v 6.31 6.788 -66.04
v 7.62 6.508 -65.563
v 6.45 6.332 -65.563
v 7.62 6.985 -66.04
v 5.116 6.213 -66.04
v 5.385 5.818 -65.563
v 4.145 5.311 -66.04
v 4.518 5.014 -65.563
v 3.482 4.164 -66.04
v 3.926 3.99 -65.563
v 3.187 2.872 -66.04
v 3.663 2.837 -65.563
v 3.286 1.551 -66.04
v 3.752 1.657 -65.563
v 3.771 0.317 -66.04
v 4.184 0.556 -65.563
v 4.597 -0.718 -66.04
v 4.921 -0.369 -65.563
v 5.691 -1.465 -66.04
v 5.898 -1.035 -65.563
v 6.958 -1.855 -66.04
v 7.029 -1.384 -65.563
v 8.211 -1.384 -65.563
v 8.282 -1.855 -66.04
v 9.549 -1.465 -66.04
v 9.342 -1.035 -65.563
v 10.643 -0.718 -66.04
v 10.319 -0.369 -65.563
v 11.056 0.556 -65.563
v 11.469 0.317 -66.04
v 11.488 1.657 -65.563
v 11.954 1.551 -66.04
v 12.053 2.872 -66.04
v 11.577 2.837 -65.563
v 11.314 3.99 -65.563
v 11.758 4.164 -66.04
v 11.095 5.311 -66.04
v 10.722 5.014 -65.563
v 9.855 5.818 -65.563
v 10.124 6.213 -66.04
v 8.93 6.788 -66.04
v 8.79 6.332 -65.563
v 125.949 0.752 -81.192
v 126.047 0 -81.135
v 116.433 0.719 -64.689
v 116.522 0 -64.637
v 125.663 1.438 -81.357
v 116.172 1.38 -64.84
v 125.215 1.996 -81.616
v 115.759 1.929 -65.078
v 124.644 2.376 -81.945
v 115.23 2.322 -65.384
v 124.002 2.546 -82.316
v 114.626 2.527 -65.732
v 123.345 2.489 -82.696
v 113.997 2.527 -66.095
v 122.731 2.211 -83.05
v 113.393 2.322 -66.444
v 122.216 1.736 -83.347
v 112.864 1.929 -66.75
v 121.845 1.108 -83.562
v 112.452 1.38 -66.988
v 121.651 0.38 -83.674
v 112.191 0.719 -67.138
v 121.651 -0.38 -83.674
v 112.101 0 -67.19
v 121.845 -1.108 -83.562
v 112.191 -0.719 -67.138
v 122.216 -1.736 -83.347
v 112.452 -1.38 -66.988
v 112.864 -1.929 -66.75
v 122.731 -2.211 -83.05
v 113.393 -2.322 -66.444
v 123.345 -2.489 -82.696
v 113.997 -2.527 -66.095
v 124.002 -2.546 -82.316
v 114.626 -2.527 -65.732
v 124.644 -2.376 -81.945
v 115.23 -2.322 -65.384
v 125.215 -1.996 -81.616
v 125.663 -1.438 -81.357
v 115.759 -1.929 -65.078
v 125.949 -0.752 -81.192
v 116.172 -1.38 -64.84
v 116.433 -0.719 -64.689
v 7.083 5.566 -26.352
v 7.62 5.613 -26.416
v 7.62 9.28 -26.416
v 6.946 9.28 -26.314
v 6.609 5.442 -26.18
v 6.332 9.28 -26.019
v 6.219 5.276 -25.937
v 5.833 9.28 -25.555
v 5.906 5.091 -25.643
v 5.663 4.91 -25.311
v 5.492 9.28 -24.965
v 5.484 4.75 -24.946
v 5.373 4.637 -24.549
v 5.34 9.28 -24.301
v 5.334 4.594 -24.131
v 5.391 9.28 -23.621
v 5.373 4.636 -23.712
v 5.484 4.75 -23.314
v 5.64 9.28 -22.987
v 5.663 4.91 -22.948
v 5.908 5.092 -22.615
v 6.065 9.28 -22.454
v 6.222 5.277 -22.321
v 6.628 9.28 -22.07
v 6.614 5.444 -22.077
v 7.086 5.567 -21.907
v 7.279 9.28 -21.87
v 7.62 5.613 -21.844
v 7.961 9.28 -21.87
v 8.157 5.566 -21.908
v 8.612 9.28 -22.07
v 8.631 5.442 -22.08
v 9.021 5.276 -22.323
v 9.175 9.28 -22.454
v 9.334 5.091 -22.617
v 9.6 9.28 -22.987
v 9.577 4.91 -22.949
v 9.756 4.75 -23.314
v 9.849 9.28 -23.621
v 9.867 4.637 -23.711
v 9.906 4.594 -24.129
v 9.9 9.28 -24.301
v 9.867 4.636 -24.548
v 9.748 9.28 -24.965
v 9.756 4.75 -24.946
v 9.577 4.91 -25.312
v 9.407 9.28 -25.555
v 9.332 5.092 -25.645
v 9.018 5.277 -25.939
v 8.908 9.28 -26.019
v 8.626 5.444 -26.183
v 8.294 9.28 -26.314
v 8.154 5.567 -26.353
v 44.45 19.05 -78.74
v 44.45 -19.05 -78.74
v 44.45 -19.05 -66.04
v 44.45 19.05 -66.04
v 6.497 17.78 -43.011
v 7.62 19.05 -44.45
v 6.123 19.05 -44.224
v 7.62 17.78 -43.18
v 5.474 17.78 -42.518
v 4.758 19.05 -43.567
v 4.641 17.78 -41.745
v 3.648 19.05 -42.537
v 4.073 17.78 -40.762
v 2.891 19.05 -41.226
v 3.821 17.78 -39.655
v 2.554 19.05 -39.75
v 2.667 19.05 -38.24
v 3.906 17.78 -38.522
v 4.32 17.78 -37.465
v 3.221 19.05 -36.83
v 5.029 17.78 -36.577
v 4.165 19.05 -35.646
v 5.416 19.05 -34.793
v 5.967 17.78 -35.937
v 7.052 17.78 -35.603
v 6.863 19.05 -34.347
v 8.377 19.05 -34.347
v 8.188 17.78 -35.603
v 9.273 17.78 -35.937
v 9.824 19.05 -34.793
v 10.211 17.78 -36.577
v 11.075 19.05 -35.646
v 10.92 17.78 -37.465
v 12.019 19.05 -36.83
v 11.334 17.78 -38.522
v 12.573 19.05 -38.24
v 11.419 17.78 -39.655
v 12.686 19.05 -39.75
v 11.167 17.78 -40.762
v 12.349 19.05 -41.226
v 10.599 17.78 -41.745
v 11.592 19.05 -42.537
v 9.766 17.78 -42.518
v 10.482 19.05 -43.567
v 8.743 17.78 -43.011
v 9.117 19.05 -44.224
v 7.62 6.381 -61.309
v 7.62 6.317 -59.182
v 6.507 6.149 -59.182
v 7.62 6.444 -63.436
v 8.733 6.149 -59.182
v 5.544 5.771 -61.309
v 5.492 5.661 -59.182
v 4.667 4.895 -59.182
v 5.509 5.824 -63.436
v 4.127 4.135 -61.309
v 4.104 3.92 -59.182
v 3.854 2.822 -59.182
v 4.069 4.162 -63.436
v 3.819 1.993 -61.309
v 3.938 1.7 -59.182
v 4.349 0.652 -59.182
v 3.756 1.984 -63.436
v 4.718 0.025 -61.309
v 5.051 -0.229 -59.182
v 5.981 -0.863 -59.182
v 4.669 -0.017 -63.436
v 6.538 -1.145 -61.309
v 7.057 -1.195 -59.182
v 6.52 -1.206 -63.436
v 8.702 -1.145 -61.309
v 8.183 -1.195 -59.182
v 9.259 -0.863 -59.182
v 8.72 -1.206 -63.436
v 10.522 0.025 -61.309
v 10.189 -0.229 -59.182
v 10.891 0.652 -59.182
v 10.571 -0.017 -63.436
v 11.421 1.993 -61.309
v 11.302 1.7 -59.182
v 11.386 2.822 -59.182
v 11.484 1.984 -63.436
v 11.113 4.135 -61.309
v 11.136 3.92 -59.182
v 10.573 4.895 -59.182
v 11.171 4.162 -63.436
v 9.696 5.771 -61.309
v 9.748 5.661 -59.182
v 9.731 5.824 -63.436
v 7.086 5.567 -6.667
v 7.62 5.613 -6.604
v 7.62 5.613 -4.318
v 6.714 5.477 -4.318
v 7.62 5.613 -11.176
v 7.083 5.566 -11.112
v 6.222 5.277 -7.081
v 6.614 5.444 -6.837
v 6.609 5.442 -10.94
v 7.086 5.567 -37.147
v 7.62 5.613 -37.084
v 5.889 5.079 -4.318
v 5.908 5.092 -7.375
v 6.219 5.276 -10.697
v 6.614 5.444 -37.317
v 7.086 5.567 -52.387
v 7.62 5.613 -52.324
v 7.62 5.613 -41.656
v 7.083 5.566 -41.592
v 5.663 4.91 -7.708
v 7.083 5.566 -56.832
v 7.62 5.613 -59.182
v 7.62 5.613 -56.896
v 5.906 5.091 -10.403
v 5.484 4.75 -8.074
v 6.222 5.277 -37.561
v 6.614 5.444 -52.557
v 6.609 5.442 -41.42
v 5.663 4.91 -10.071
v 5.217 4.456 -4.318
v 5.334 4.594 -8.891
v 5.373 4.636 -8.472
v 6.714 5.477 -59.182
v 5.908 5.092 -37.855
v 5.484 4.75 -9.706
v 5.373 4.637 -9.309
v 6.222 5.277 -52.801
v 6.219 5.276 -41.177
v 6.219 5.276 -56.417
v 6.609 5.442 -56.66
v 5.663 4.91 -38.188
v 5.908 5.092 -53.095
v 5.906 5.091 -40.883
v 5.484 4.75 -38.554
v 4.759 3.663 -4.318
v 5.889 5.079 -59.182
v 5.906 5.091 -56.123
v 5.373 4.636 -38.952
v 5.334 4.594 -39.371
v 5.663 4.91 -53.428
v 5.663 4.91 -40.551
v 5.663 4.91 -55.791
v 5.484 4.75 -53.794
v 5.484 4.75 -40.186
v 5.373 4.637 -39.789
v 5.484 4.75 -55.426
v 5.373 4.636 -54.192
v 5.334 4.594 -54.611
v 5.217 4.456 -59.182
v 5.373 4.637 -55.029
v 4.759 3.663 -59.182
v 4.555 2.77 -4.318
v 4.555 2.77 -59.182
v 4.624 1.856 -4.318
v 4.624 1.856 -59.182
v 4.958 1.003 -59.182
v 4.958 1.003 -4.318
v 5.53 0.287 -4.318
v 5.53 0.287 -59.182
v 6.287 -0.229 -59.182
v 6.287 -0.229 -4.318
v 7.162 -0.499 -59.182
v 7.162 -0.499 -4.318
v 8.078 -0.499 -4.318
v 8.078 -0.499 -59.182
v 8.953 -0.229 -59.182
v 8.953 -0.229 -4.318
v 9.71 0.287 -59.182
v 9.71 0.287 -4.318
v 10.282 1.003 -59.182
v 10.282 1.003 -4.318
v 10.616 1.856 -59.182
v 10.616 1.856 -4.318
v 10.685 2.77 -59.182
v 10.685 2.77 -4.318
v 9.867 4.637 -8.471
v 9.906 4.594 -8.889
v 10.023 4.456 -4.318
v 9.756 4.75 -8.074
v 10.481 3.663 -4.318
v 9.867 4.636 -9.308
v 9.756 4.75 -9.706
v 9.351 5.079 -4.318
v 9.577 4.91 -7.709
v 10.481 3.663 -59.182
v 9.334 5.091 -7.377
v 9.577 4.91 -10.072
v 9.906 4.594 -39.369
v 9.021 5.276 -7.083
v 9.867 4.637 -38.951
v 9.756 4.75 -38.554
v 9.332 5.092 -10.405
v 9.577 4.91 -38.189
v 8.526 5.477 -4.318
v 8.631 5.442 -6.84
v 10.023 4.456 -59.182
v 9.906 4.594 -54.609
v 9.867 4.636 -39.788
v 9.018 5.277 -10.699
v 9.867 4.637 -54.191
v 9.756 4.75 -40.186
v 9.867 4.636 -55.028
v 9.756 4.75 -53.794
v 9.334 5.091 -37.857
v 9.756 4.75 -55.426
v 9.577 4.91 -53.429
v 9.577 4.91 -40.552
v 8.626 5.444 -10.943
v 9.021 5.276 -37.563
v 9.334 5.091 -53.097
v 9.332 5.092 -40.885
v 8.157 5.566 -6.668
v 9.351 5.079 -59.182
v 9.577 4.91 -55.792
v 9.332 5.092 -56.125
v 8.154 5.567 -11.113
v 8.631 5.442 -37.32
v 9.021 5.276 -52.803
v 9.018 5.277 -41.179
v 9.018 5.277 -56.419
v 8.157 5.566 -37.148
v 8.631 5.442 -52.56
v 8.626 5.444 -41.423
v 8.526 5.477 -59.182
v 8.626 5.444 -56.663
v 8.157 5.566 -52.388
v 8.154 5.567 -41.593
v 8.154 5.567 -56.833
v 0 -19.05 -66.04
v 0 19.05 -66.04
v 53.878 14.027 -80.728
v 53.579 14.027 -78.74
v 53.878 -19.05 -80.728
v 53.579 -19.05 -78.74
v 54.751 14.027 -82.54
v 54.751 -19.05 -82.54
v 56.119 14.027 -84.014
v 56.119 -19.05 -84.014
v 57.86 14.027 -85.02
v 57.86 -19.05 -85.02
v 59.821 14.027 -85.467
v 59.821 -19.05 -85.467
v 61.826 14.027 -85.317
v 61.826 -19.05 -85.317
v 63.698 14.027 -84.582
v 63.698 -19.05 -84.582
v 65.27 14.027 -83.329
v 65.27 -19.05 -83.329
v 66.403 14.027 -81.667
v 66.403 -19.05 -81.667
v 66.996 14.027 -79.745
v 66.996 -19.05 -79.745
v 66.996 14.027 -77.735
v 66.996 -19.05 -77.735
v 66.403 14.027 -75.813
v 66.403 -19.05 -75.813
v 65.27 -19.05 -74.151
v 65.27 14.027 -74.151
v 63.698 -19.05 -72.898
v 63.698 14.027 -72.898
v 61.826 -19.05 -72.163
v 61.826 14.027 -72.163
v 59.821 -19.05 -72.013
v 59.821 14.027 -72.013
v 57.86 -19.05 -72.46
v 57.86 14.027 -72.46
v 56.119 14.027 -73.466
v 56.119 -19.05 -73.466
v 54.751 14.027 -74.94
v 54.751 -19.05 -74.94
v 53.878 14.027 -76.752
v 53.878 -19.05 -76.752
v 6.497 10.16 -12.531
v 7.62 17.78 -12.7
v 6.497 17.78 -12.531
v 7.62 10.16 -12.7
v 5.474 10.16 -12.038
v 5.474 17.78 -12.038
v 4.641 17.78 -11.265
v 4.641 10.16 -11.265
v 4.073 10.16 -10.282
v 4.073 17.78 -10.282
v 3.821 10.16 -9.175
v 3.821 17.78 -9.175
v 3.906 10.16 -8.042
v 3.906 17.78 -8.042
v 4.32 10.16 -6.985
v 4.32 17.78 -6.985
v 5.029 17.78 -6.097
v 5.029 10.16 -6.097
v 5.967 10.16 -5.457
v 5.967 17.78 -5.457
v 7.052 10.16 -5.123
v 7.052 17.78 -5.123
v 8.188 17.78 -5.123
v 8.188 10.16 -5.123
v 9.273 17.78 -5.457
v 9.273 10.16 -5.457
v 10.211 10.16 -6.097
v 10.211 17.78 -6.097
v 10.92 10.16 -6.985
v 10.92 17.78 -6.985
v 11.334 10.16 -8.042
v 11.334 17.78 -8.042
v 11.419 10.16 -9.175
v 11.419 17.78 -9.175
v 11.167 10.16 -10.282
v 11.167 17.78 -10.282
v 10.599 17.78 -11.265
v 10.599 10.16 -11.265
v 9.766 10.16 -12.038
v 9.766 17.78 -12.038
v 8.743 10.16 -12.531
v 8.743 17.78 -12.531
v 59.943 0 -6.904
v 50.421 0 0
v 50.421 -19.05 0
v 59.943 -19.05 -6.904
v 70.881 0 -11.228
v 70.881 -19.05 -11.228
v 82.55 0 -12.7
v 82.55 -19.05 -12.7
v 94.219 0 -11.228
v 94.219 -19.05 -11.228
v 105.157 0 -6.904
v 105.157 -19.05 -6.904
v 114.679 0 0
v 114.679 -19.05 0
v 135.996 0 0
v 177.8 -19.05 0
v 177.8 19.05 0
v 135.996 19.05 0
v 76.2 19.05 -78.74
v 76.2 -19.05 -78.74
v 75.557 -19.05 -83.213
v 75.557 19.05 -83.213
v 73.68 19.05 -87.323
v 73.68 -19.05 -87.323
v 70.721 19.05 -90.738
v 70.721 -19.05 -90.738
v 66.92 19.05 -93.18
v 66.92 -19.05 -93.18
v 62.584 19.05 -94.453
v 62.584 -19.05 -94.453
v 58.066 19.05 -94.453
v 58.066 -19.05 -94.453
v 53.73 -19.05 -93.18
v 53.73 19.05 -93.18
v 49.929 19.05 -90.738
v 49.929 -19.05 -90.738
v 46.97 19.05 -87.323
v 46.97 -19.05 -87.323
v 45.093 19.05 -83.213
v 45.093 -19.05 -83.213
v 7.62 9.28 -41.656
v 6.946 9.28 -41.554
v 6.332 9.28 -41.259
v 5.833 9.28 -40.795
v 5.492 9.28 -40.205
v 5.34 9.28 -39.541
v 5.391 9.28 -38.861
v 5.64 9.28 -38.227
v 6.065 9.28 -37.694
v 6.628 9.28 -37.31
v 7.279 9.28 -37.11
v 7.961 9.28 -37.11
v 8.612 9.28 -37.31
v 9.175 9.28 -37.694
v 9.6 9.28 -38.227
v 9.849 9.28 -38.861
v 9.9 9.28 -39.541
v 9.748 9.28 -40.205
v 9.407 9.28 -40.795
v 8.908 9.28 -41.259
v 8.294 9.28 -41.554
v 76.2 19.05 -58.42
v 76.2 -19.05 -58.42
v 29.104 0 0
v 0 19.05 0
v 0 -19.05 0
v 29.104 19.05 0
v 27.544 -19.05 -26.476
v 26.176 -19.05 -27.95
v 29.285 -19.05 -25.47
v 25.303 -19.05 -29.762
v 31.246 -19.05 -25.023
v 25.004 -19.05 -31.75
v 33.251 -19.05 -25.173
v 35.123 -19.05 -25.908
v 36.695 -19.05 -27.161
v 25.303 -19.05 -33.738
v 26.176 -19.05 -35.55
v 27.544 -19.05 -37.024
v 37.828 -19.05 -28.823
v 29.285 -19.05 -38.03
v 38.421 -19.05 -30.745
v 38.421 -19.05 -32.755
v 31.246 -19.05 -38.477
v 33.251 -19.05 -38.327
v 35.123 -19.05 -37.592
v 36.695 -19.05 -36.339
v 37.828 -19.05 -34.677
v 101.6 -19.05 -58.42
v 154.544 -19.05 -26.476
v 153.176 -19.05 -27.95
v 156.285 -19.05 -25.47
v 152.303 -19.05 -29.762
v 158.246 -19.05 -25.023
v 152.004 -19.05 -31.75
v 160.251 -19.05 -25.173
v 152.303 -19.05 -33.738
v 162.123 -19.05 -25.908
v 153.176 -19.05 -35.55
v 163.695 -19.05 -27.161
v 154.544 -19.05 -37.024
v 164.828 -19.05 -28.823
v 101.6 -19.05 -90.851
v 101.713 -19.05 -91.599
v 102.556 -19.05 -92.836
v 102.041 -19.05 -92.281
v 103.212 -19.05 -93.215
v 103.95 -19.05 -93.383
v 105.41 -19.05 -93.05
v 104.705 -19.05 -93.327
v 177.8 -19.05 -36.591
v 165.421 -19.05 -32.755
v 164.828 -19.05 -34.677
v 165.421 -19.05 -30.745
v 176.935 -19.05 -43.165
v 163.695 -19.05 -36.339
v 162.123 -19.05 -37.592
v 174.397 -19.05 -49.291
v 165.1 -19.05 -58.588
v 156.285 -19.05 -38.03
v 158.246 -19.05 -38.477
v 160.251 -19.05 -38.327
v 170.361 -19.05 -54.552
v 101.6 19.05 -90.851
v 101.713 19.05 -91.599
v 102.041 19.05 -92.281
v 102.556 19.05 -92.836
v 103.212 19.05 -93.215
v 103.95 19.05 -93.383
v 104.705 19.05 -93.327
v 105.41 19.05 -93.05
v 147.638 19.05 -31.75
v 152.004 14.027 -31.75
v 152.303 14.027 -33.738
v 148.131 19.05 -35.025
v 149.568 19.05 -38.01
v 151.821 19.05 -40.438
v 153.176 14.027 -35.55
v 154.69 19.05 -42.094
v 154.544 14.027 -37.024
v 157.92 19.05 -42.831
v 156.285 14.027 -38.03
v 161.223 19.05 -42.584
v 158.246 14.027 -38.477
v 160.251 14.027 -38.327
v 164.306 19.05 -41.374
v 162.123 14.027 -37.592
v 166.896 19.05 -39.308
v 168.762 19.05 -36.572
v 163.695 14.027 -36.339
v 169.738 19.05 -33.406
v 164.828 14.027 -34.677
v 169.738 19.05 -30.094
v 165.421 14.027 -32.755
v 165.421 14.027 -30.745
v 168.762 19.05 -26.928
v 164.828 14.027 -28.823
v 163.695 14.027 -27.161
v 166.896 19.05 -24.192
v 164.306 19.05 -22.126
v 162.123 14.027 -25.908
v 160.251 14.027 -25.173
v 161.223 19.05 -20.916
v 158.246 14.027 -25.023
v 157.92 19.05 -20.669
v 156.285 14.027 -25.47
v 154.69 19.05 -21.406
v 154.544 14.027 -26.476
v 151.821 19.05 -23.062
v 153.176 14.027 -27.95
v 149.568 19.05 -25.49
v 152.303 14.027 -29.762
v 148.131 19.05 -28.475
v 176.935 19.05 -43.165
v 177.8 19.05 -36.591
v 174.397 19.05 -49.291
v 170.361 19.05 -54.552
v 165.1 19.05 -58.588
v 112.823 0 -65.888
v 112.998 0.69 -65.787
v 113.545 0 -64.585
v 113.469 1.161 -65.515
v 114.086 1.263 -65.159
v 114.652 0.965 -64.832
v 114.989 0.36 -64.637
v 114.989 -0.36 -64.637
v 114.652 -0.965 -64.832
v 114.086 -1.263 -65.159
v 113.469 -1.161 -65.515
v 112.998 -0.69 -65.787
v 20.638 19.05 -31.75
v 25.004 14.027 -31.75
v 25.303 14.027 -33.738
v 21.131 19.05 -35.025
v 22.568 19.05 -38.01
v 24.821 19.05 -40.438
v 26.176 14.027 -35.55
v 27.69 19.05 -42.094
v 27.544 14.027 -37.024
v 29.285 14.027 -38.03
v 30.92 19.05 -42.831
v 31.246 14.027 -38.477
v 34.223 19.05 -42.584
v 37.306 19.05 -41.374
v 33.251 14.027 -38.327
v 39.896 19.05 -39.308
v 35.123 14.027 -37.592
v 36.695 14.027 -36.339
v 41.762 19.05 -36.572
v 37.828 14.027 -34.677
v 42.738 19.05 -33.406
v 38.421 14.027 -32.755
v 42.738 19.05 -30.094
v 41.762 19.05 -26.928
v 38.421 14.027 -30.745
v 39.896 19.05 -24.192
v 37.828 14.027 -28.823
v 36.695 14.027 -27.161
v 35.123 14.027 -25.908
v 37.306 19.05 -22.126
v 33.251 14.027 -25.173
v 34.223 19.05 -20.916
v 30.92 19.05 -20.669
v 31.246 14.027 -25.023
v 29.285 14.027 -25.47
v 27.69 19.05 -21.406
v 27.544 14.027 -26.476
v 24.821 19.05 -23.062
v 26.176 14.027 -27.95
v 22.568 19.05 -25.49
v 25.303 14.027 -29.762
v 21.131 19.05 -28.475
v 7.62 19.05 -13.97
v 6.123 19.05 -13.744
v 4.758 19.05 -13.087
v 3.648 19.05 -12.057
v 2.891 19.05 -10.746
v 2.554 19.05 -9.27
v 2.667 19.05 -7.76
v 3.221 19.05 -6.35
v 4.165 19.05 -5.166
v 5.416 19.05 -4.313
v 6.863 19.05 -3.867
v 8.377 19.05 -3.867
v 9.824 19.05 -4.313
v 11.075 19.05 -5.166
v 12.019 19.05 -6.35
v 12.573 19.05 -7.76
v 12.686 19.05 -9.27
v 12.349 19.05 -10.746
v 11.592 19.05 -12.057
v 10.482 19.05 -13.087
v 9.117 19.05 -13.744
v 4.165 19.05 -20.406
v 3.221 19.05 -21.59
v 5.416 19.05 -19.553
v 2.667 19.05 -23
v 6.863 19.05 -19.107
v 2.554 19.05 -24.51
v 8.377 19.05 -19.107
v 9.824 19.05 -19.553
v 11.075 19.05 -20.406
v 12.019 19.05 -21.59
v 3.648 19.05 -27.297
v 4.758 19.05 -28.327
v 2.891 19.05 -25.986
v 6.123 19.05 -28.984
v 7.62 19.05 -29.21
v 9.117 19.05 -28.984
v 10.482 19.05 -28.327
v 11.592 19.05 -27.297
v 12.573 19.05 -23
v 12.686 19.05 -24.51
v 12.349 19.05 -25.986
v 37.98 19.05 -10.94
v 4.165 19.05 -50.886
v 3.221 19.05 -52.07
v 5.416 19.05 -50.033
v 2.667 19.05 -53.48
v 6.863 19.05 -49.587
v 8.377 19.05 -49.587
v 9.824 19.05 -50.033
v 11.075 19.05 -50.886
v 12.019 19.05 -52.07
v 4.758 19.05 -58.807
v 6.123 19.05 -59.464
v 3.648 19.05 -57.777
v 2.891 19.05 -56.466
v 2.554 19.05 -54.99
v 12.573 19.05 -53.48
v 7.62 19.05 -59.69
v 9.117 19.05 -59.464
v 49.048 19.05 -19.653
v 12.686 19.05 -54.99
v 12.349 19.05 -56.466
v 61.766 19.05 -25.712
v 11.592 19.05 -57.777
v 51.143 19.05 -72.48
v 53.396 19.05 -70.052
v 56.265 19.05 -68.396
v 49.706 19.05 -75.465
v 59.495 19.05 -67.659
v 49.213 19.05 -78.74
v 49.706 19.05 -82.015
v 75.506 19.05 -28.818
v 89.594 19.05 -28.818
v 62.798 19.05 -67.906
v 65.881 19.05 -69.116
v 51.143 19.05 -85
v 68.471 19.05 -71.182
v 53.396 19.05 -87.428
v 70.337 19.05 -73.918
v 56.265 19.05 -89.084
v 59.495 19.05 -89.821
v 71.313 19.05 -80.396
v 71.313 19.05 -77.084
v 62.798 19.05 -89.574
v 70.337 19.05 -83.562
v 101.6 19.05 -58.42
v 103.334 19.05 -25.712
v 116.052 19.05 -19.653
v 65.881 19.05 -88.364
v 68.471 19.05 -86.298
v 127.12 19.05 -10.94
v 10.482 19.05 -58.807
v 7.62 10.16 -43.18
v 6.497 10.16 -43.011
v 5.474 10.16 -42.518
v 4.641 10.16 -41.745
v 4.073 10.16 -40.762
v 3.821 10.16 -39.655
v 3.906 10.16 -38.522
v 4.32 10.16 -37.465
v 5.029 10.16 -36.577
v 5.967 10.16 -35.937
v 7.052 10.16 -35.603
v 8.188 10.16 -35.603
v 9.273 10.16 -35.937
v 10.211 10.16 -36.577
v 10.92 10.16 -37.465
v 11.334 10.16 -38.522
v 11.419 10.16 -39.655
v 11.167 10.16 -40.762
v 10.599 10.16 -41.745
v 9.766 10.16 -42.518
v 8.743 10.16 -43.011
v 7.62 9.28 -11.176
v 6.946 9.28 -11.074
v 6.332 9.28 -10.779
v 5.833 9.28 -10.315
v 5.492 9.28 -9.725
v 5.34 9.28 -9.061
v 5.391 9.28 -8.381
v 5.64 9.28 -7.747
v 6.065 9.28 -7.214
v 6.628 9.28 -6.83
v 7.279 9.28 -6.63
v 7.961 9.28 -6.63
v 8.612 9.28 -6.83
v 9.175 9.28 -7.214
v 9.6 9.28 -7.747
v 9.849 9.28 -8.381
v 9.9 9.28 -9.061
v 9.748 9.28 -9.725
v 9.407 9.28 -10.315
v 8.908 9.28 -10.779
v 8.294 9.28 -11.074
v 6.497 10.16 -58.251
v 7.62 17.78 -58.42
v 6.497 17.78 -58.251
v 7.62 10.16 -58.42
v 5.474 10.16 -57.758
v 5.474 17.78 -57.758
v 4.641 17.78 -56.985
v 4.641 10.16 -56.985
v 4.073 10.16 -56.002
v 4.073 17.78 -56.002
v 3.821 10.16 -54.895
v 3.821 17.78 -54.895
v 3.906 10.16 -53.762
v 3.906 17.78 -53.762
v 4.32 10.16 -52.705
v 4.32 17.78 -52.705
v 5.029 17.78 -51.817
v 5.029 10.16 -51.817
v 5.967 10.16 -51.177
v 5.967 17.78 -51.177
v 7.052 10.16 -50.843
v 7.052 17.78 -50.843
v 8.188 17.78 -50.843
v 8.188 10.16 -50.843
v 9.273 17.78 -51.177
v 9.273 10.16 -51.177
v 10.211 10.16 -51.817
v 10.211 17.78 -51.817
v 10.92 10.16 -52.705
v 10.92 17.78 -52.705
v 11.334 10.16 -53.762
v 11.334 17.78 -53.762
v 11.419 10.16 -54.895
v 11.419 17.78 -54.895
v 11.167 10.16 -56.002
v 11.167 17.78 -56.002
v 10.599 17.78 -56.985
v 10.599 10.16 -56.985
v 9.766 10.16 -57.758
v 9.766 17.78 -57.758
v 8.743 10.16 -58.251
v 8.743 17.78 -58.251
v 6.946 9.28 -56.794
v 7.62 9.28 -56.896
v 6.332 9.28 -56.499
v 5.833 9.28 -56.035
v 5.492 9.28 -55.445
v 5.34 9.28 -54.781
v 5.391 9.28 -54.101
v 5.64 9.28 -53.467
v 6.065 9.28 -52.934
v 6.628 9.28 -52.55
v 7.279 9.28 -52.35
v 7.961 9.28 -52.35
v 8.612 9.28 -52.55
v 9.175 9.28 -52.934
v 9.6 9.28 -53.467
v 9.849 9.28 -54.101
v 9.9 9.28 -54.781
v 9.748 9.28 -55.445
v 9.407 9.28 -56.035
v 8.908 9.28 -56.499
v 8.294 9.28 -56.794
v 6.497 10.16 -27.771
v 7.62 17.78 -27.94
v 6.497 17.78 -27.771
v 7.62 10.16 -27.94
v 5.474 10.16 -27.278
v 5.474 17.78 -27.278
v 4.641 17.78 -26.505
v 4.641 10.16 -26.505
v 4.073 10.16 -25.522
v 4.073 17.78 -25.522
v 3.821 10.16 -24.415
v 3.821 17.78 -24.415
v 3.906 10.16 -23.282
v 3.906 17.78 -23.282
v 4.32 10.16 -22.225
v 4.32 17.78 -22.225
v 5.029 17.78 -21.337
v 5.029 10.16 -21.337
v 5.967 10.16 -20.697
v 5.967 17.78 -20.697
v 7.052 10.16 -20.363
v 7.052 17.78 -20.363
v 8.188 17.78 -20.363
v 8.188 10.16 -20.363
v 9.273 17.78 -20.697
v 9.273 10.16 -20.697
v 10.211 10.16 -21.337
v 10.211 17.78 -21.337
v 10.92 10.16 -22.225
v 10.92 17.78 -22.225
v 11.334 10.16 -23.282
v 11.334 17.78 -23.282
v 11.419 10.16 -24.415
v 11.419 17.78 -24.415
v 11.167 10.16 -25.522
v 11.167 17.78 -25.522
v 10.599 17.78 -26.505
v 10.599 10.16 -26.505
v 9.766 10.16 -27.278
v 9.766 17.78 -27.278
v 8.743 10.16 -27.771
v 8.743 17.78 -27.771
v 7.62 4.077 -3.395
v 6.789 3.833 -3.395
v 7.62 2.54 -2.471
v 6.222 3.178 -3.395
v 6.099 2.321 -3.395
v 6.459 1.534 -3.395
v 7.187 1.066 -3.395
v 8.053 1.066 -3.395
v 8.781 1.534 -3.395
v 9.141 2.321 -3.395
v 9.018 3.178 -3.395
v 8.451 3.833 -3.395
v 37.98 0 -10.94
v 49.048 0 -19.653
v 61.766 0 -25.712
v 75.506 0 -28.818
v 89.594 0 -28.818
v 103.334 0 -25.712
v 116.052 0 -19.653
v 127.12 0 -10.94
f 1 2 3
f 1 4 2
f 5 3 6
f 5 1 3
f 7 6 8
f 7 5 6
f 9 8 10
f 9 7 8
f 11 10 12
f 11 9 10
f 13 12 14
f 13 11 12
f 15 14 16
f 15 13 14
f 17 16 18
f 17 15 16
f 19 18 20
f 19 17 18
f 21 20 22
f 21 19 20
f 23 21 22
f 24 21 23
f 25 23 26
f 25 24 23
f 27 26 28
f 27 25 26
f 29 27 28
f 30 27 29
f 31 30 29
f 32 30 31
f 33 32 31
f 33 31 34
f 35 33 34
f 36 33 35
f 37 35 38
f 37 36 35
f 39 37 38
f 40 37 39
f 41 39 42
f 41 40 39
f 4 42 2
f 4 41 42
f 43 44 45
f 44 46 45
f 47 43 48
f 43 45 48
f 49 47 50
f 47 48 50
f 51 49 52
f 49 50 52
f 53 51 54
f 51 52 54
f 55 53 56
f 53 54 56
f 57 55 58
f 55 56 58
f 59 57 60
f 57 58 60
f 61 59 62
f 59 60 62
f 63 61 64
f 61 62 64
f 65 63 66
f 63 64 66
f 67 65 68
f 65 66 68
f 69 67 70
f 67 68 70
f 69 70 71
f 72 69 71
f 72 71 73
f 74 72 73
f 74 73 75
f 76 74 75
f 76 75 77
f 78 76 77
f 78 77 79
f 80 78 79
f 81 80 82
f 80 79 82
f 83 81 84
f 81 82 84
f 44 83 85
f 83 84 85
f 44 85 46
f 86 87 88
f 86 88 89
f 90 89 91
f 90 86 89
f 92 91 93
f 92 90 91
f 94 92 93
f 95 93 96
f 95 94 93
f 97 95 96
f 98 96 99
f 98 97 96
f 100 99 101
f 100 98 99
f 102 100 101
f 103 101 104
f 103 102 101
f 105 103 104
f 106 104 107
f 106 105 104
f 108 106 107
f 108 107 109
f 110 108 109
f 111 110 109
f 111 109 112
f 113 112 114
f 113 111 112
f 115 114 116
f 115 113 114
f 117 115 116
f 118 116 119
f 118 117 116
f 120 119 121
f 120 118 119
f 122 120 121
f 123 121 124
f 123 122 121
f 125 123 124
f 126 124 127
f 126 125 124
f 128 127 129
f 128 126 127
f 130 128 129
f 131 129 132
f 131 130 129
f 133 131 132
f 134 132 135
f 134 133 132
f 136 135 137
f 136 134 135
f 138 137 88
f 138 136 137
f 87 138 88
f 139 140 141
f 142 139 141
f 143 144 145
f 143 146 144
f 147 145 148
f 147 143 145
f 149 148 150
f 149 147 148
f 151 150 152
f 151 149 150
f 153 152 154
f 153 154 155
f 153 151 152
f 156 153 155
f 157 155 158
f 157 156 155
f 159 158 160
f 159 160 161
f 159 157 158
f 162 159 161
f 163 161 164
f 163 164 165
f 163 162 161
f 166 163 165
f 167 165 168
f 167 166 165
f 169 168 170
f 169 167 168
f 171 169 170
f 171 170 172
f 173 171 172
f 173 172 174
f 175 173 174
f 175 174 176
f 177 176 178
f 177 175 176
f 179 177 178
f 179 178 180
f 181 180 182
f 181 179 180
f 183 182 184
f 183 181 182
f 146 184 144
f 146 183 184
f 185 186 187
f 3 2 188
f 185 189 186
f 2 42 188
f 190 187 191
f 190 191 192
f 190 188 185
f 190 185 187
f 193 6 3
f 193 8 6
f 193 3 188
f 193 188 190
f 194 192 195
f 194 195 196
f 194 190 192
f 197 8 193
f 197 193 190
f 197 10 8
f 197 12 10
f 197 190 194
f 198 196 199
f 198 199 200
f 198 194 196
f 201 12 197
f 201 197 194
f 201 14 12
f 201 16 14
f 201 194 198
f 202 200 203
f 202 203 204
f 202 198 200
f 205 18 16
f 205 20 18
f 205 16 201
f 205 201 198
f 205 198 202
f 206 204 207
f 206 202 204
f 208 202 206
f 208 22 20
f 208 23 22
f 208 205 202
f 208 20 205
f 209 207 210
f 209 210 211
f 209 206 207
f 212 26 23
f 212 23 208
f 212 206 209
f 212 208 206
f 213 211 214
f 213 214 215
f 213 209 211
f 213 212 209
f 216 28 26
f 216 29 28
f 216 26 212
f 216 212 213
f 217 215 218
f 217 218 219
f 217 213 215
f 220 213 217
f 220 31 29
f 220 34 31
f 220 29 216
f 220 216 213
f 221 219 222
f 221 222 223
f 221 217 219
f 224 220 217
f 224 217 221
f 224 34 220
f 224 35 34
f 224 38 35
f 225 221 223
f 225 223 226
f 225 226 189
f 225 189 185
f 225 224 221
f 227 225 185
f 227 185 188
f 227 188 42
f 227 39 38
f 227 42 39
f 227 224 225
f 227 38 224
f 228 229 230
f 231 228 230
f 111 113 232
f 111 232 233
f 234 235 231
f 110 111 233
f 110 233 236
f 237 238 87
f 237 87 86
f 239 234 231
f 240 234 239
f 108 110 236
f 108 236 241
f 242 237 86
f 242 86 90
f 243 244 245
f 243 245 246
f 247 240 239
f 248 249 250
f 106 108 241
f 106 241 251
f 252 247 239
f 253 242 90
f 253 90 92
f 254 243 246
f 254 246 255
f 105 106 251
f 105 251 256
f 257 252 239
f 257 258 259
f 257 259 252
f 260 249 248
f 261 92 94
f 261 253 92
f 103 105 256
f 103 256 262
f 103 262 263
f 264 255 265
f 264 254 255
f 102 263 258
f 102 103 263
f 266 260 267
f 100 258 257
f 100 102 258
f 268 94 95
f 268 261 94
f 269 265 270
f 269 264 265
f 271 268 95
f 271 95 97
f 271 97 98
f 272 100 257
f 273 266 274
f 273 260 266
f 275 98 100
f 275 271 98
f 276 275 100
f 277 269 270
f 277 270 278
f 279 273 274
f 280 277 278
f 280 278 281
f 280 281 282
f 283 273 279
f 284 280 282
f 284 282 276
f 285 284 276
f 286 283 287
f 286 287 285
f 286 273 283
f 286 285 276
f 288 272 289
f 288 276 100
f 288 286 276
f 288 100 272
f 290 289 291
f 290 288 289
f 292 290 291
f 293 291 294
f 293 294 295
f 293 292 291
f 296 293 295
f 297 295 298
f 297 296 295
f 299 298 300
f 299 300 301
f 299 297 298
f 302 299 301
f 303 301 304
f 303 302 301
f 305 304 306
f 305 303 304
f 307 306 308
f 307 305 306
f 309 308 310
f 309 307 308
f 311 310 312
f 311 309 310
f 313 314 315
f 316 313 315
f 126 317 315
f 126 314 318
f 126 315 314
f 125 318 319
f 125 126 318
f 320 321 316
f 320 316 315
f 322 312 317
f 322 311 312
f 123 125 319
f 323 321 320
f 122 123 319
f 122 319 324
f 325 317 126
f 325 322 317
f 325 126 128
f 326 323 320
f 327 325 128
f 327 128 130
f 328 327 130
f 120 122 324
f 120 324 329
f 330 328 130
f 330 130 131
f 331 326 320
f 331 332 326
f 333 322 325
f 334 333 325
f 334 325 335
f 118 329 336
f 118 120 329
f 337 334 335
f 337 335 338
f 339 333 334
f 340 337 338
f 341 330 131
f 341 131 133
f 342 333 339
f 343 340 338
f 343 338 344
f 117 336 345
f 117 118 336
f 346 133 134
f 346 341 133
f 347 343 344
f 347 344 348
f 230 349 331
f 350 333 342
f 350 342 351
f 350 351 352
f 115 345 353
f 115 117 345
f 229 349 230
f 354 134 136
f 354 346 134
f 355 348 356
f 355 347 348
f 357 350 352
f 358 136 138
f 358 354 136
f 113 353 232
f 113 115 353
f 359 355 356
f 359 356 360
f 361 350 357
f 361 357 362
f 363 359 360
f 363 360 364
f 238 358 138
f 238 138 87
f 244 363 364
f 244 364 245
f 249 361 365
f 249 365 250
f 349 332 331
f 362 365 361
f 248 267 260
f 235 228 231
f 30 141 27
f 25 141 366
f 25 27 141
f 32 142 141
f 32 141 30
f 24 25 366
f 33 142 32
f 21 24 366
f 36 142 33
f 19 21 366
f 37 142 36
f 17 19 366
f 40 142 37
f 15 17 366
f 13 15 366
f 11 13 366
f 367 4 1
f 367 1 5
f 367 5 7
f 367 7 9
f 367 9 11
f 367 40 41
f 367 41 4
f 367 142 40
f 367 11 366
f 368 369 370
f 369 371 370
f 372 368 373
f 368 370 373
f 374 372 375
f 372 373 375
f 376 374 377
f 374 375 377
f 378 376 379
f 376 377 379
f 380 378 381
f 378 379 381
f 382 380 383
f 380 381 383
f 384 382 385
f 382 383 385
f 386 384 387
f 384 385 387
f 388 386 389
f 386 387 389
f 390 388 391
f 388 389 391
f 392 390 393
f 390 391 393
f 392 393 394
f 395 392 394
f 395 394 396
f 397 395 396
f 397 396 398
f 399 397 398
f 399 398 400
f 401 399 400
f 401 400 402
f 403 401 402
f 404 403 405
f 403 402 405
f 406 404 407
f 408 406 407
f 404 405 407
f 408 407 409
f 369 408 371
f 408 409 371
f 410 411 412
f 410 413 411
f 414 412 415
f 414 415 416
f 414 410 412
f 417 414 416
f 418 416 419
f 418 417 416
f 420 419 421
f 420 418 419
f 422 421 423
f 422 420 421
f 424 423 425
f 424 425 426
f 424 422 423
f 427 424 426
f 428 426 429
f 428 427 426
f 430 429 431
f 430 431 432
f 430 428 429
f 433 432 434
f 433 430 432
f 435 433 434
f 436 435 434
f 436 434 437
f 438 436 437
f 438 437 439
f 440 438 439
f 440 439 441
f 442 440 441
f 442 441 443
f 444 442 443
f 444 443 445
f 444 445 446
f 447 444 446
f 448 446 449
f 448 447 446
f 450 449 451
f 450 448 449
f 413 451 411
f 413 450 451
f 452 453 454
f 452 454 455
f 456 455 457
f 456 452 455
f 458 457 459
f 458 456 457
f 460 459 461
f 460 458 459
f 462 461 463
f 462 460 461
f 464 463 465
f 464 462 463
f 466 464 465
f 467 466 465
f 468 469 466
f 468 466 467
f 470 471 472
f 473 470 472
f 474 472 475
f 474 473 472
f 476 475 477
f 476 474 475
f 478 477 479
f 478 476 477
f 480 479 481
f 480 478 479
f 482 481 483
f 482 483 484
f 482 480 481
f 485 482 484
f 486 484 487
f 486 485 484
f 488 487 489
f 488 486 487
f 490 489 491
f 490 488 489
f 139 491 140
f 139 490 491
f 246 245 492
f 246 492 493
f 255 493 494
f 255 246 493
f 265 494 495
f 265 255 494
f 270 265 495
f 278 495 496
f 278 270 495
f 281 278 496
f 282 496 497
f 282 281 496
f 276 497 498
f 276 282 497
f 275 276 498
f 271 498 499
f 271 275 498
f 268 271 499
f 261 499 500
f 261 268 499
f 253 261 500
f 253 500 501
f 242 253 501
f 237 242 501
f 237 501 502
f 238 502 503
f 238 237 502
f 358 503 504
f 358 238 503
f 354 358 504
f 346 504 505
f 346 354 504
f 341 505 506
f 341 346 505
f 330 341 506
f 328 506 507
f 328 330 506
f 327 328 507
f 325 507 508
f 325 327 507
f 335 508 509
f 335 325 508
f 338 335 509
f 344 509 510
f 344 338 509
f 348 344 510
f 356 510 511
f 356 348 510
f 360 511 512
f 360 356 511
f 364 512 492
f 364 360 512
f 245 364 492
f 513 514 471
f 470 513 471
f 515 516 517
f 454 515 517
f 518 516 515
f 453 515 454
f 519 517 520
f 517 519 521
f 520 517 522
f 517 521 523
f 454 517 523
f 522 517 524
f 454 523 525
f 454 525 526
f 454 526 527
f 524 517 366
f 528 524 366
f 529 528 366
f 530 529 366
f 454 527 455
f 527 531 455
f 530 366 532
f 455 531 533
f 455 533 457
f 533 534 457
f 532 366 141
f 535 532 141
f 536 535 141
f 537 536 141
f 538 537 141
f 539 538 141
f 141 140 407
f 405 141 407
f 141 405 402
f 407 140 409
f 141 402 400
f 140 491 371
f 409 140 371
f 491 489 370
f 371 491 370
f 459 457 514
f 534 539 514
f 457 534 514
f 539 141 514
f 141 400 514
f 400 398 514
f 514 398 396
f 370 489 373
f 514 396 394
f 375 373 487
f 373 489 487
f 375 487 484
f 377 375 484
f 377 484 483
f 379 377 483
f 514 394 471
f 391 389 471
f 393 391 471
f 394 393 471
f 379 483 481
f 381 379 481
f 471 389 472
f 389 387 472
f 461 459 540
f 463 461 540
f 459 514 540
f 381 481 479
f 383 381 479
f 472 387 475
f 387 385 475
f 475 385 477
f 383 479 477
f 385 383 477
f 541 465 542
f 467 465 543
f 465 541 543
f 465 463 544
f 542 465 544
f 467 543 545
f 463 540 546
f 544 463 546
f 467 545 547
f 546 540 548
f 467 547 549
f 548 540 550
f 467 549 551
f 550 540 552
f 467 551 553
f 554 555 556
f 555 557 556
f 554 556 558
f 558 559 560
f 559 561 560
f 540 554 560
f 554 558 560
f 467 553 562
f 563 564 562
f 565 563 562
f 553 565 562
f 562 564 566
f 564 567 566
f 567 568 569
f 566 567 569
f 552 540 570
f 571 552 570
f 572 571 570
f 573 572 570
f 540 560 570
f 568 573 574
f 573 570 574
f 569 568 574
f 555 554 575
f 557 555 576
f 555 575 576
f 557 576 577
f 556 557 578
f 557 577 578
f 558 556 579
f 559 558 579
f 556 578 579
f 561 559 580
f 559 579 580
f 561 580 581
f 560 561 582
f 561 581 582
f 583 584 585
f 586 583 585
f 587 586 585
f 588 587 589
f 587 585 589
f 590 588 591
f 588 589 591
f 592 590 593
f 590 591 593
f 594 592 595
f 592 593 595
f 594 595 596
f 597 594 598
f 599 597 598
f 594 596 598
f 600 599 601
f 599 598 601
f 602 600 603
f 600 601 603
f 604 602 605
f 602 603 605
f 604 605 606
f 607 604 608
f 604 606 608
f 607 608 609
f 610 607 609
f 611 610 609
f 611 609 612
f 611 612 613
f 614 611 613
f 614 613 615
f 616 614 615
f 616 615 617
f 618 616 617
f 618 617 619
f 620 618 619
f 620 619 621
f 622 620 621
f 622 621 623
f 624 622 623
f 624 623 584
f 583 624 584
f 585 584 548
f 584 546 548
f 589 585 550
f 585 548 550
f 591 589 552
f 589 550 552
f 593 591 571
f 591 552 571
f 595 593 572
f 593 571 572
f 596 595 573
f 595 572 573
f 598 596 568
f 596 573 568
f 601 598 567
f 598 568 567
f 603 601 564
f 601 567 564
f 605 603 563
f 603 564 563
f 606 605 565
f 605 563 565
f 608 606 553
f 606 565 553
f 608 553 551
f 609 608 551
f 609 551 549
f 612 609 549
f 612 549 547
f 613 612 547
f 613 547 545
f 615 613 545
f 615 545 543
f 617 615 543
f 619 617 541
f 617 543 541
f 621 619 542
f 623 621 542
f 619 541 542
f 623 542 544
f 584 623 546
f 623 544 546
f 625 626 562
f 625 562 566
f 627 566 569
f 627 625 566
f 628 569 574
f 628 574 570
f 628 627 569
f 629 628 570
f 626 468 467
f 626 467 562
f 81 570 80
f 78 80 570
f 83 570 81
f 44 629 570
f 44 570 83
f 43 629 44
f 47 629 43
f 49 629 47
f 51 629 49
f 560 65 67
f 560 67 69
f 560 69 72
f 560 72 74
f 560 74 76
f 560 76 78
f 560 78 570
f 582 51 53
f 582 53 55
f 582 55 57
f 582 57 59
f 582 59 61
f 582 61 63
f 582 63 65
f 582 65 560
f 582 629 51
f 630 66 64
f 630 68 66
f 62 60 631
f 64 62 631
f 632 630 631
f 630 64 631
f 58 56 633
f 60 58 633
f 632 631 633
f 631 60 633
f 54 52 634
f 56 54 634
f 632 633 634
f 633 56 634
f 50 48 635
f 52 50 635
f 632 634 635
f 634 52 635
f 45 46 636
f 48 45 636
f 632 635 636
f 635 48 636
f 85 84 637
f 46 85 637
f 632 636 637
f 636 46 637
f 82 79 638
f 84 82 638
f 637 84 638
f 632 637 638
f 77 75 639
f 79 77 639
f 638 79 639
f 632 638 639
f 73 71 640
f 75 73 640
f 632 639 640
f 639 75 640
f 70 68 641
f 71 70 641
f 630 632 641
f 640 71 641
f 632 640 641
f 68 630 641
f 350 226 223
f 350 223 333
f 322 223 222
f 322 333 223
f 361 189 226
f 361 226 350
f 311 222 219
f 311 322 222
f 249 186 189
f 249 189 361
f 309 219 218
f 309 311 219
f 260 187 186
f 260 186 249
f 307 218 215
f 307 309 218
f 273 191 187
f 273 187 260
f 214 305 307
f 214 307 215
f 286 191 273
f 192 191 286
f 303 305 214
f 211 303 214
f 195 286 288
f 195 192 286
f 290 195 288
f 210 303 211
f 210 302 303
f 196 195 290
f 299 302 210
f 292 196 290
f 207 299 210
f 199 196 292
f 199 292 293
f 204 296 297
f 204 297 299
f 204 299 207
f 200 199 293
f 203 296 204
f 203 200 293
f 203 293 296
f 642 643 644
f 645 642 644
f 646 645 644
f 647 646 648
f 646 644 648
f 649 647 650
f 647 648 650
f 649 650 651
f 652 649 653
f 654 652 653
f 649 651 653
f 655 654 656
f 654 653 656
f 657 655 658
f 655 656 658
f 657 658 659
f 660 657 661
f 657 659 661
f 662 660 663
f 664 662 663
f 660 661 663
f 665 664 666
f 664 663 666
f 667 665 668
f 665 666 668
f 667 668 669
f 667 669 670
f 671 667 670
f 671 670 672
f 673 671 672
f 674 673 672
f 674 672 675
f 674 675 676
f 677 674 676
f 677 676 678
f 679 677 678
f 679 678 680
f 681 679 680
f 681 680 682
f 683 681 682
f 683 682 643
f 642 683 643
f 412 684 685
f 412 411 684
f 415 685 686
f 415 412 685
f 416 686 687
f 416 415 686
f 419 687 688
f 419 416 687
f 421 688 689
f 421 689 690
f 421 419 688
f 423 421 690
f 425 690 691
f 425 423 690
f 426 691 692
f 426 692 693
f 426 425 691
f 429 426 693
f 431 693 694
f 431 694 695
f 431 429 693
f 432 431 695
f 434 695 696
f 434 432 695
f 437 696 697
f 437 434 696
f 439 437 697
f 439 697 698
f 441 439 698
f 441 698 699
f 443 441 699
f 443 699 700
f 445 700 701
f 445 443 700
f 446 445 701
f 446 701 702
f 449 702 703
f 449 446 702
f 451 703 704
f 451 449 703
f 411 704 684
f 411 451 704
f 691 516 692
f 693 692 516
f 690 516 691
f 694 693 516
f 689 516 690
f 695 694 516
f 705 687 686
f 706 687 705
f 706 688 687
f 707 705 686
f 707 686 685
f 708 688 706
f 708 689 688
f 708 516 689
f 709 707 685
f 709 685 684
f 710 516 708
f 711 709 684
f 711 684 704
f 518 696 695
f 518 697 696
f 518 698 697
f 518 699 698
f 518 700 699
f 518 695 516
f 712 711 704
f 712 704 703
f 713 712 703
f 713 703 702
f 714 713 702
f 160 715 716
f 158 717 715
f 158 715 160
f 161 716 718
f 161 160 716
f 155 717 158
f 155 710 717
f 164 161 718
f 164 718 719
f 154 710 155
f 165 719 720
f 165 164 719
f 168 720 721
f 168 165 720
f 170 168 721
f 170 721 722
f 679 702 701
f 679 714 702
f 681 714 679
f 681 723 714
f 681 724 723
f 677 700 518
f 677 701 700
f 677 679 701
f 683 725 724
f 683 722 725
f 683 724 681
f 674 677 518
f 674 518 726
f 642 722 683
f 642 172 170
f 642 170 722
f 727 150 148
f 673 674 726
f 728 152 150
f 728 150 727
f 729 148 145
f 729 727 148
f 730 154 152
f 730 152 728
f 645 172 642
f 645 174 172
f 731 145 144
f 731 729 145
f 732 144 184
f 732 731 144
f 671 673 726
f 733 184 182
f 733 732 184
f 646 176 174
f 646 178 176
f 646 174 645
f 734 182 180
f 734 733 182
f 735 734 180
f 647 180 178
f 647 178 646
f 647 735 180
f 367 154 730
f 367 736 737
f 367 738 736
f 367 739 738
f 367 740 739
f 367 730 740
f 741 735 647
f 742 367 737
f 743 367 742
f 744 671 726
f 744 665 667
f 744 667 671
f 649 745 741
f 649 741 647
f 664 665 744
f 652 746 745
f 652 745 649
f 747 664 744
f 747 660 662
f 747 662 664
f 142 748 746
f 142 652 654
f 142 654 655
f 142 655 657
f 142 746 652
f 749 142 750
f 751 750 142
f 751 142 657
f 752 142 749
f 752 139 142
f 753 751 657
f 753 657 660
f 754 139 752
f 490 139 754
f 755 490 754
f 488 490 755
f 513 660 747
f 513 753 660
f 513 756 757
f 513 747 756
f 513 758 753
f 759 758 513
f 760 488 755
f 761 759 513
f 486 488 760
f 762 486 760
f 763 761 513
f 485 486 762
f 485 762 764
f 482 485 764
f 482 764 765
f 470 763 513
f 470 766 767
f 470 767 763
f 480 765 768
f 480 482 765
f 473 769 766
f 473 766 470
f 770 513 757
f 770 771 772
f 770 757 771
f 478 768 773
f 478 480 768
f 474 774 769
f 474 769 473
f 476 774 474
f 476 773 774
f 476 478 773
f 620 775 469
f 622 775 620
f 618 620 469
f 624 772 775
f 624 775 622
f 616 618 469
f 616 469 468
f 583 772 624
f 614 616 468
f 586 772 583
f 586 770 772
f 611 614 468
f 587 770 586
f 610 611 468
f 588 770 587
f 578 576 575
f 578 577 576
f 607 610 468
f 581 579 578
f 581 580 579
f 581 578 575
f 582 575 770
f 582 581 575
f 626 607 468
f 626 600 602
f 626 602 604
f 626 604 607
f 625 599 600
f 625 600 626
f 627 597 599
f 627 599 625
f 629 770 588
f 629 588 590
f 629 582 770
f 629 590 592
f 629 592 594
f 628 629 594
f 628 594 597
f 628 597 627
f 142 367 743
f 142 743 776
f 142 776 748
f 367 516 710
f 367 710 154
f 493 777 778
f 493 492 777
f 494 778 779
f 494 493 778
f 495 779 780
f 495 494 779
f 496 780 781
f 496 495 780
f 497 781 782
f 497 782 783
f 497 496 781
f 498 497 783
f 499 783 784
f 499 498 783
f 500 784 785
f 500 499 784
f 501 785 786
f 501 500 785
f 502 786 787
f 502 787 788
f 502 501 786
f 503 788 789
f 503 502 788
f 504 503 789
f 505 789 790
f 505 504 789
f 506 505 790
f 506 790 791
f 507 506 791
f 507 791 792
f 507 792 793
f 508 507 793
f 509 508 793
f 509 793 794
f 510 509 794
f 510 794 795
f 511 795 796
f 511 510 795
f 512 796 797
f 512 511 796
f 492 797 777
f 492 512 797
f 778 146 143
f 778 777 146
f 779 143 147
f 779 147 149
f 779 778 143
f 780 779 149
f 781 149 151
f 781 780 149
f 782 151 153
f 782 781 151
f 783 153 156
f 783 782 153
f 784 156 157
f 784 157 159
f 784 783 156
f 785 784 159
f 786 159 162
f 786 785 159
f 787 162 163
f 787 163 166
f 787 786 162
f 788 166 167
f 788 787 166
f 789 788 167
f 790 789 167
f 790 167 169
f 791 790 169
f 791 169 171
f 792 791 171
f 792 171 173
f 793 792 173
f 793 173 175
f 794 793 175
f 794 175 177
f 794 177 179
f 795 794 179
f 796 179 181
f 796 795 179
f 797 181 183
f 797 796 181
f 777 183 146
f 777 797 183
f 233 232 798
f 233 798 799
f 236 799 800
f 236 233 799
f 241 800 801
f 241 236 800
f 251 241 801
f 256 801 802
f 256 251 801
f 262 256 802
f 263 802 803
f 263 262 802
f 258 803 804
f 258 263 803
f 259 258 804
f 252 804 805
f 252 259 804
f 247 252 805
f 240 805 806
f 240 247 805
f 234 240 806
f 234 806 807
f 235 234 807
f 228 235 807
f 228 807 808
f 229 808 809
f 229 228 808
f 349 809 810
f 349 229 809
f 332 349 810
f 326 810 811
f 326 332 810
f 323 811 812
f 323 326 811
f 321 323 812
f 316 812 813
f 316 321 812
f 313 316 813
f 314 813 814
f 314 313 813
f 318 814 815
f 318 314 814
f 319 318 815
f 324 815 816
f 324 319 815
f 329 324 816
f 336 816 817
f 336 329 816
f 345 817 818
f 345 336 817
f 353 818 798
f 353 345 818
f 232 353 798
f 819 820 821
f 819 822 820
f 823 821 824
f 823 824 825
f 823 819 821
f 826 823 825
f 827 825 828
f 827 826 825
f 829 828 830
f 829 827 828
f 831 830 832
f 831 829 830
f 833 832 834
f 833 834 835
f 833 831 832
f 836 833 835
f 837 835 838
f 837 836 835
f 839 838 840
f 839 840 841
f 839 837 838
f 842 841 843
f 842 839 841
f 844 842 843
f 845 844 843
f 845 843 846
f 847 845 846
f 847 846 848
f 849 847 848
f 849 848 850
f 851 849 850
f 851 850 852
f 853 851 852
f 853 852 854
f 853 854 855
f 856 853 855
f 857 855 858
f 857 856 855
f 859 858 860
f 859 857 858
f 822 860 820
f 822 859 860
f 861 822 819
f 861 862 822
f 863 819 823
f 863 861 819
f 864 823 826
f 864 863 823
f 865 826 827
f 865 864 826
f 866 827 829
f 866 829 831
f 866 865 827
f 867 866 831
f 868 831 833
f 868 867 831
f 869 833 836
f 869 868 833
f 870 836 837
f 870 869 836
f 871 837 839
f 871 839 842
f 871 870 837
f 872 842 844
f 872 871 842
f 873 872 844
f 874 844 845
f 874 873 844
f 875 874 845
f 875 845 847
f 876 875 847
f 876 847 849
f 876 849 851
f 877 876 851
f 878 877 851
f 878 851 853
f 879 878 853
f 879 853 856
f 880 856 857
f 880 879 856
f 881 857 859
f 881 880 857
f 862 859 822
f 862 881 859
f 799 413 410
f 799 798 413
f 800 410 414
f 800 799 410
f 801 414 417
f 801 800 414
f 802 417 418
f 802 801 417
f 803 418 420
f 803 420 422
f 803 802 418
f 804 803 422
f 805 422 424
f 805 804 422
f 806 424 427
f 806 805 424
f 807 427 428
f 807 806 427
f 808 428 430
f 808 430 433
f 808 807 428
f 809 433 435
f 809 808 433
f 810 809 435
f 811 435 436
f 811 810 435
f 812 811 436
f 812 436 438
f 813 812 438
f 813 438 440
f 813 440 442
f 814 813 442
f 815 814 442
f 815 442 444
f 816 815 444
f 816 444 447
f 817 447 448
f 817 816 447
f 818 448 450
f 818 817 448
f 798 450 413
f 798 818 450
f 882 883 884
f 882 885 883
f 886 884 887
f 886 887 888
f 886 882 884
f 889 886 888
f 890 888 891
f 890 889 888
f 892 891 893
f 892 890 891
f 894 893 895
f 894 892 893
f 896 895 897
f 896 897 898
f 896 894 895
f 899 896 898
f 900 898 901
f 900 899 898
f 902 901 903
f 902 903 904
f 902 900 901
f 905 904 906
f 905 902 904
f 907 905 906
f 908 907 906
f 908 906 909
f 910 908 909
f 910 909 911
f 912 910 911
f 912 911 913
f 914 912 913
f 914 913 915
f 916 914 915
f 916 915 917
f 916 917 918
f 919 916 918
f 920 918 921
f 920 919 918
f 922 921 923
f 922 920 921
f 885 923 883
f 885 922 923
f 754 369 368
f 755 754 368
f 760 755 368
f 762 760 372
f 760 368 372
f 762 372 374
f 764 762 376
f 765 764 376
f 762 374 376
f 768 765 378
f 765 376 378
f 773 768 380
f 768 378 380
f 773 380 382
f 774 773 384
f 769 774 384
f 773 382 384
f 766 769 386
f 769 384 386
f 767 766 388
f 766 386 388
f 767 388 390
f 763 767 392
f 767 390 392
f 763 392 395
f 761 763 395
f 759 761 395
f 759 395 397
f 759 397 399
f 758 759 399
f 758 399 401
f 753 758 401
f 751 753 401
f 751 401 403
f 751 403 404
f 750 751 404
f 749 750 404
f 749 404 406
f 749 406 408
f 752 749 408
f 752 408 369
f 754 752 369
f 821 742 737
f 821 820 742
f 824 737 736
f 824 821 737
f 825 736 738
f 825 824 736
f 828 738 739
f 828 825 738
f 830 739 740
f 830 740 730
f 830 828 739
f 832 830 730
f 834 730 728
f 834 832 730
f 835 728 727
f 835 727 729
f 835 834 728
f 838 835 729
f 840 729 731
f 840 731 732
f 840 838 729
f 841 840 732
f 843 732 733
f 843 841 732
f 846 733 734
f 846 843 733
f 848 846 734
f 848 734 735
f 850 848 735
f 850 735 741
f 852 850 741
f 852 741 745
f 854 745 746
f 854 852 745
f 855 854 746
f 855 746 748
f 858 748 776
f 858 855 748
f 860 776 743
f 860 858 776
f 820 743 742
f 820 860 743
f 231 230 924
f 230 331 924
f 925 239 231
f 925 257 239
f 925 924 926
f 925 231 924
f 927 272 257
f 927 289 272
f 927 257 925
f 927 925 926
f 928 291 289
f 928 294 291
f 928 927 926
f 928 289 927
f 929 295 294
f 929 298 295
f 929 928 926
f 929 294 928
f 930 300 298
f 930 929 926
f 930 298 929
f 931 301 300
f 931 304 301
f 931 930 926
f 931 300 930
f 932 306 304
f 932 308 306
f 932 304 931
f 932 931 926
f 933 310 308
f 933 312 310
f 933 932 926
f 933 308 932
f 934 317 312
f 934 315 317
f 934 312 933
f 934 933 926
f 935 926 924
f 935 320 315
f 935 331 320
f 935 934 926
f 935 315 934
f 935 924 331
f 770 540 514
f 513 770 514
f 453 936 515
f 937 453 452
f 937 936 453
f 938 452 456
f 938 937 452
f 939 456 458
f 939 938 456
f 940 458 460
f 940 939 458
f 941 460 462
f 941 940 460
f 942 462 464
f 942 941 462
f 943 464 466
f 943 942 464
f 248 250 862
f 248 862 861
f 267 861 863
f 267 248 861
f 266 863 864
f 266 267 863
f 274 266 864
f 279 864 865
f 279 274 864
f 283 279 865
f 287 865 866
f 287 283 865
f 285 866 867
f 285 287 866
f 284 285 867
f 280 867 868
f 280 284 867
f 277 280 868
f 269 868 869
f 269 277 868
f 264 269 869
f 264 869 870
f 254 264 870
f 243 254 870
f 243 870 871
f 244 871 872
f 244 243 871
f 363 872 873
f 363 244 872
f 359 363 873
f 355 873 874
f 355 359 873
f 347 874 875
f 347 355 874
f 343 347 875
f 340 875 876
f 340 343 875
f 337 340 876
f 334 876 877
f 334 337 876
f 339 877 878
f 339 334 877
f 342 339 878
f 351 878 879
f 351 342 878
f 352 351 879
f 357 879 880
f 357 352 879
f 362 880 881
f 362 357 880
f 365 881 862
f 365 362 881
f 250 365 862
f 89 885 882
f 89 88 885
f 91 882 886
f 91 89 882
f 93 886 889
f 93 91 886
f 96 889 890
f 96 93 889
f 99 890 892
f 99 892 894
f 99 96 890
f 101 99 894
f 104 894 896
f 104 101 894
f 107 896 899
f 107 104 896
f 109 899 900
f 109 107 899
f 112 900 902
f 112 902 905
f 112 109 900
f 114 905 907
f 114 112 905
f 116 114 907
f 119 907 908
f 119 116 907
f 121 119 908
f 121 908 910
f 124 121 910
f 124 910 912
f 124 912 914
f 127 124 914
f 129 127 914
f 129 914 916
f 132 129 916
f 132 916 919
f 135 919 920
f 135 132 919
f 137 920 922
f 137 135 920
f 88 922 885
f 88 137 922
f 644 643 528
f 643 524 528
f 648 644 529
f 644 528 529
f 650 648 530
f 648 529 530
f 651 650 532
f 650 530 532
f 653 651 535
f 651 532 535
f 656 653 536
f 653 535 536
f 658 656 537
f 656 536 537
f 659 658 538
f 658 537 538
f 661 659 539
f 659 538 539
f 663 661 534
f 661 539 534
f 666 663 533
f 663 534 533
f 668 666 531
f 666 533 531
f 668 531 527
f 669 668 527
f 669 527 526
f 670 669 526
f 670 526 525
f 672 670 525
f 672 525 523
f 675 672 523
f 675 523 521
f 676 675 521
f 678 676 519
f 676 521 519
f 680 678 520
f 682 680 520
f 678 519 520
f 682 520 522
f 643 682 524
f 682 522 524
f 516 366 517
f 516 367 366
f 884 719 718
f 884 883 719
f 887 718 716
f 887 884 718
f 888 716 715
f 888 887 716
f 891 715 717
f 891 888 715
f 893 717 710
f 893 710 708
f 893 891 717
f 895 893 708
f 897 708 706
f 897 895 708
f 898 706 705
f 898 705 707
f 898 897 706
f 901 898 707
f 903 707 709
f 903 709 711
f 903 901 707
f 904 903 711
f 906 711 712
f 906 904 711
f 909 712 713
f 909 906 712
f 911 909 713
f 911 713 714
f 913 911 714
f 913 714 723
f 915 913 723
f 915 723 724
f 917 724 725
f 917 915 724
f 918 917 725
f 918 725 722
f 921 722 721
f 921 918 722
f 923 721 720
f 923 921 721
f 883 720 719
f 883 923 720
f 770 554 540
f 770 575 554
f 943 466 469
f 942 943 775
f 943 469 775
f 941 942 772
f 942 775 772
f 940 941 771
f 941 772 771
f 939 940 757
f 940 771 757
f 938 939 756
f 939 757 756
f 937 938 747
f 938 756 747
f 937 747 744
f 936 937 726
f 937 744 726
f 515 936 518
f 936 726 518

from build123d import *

# Parameters (mm, degrees)
BOSS_EXTRUDE1_DEPTH                              = 19.05
F_1_4_20_TAPPED_HOLE1_D                          = 5.1054
F_1_4_20_TAPPED_HOLE1_DEPTH                      = 19.05
F_1_4_20_TAPPED_HOLE1_TIP                        = 1.533816902
SKETCH4_R                                        = 63.5
CUT_EXTRUDE1_DEPTH                               = 19.05
CSK_FOR_1_2_FLAT_HEAD_MACHINE_SCREW1_D           = 13.49248
CSK_FOR_1_2_FLAT_HEAD_MACHINE_SCREW1_CSINK_D     = 22.225
CSK_FOR_1_2_FLAT_HEAD_MACHINE_SCREW1_CSINK_ANGLE = 82
FILLET1_R                                        = 2.54
LPATTERN1_COUNT                                  = 4
LPATTERN1_PITCH                                  = 15.24


with BuildPart() as part:
    # Sketch1 → Boss-Extrude1 (new, symmetric)
    with BuildSketch(Plane(origin=(0, 0, 0), x_dir=(1, 0, 0), z_dir=(0, 1, 0))):
        with BuildLine():
            Line((0, 0), (50.421258973, 0))
            ThreePointArc((50.421258973, 0), (82.55, 12.7), (114.678741027, 0))
            Line((114.678741027, 0), (177.8, 0))
            Line((177.8, 0), (177.8, 36.59121265))
            ThreePointArc((177.8, 36.59121265), (174.397045256, 49.29121265), (165.1, 58.588257906))
            Line((165.1, 58.588257906), (101.6, 95.25))
            Line((101.6, 95.25), (101.6, 58.42))
            Line((101.6, 58.42), (76.2, 58.42))
            Line((76.2, 58.42), (76.2, 78.74))
            ThreePointArc((76.2, 78.74), (60.325, 94.615), (44.45, 78.74))
            Line((44.45, 78.74), (44.45, 66.04))
            Line((44.45, 66.04), (0, 66.04))
            Line((0, 66.04), (0, 0))
        make_face()
    extrude(amount=BOSS_EXTRUDE1_DEPTH, both=True)

    # 1/4-20 Tapped Hole1
    with Locations(Plane(origin=(66.644459855, 0, -115.431590512), x_dir=(-0.86602540378444, 0, -0.49999999999999784), z_dir=(0.49999999999999784, 0, -0.86602540378444))):
        with Locations((-66.04, 0)):
            Hole(F_1_4_20_TAPPED_HOLE1_D / 2, depth=F_1_4_20_TAPPED_HOLE1_DEPTH)
            with Locations((0, 0, -(F_1_4_20_TAPPED_HOLE1_DEPTH + F_1_4_20_TAPPED_HOLE1_TIP / 2))):  # 118° drill point
                Cone(0, F_1_4_20_TAPPED_HOLE1_D / 2, F_1_4_20_TAPPED_HOLE1_TIP, mode=Mode.SUBTRACT)

    # Sketch4 → Cut-Extrude1 (cut)
    with BuildSketch(Plane(origin=(0, 19.05, 0), x_dir=(1, 0, 0), z_dir=(0, 1, 0))):
        with Locations((82.55, -34.29)):
            Circle(SKETCH4_R)
    extrude(amount=-CUT_EXTRUDE1_DEPTH, mode=Mode.SUBTRACT)

    # CSK for 1/2 Flat Head Machine Screw1 (through all)
    with Locations(Plane(origin=(0, 19.05, 0), x_dir=(1, 0, 0), z_dir=(0, 1, 0))):
        with Locations((60.325, 78.74), (31.75, 31.75), (158.75, 31.75)):
            CounterSinkHole(CSK_FOR_1_2_FLAT_HEAD_MACHINE_SCREW1_D / 2, CSK_FOR_1_2_FLAT_HEAD_MACHINE_SCREW1_CSINK_D / 2, counter_sink_angle=CSK_FOR_1_2_FLAT_HEAD_MACHINE_SCREW1_CSINK_ANGLE)

    # Fillet1
    fillet1_edges = [part.edges().sort_by_distance(p)[0] for p in [
        (101.6, 0, -95.25),
    ]]
    fillet(fillet1_edges, radius=FILLET1_R)

    # Sketch8 → Cut-Revolve1 (revolve, cut)
    with BuildSketch(Plane(origin=(7.62, 0, 0), x_dir=(0, 0, -1), z_dir=(1, 0, 0)), mode=Mode.PRIVATE) as cut_revolve1_sk:
        Polygon((3.81, 19.05), (5.08, 17.78), (5.08, 10.16), (6.604, 9.28011819), (6.604, 2.643567375), (8.89, 1.27), (8.89, 19.05), align=None)
    cut_revolve1 = revolve(cut_revolve1_sk.sketch.rotate(Axis((7.62, 1.27, -8.89), (0, 1, 0)), 180), axis=Axis((7.62, 1.27, -8.89), (0, 1, 0)), mode=Mode.SUBTRACT)

    # LPattern1: Cut-Revolve1 ×4
    with Locations(*[(0, 0, -i * LPATTERN1_PITCH) for i in range(1, LPATTERN1_COUNT)]):
        add(cut_revolve1, mode=Mode.SUBTRACT)

    # Sketch9 → 1/16 NPT Tapped Hole1 (revolve, cut)
    with BuildSketch(Plane(origin=(7.62, 2.54, -66.04), x_dir=(0, 1, 0), z_dir=(1, 0, 0))):
        Polygon((0, 0), (0, 63.568685027), (3.0734, 61.722), (3.0734, 6.858), (3.776858756, 6.858), (3.9679118, 0.4770882), (4.445, 0), align=None)
    revolve(axis=Axis((7.62, 2.54, -72.39), (0, 0, 1)), mode=Mode.SUBTRACT)


solid = part.part
